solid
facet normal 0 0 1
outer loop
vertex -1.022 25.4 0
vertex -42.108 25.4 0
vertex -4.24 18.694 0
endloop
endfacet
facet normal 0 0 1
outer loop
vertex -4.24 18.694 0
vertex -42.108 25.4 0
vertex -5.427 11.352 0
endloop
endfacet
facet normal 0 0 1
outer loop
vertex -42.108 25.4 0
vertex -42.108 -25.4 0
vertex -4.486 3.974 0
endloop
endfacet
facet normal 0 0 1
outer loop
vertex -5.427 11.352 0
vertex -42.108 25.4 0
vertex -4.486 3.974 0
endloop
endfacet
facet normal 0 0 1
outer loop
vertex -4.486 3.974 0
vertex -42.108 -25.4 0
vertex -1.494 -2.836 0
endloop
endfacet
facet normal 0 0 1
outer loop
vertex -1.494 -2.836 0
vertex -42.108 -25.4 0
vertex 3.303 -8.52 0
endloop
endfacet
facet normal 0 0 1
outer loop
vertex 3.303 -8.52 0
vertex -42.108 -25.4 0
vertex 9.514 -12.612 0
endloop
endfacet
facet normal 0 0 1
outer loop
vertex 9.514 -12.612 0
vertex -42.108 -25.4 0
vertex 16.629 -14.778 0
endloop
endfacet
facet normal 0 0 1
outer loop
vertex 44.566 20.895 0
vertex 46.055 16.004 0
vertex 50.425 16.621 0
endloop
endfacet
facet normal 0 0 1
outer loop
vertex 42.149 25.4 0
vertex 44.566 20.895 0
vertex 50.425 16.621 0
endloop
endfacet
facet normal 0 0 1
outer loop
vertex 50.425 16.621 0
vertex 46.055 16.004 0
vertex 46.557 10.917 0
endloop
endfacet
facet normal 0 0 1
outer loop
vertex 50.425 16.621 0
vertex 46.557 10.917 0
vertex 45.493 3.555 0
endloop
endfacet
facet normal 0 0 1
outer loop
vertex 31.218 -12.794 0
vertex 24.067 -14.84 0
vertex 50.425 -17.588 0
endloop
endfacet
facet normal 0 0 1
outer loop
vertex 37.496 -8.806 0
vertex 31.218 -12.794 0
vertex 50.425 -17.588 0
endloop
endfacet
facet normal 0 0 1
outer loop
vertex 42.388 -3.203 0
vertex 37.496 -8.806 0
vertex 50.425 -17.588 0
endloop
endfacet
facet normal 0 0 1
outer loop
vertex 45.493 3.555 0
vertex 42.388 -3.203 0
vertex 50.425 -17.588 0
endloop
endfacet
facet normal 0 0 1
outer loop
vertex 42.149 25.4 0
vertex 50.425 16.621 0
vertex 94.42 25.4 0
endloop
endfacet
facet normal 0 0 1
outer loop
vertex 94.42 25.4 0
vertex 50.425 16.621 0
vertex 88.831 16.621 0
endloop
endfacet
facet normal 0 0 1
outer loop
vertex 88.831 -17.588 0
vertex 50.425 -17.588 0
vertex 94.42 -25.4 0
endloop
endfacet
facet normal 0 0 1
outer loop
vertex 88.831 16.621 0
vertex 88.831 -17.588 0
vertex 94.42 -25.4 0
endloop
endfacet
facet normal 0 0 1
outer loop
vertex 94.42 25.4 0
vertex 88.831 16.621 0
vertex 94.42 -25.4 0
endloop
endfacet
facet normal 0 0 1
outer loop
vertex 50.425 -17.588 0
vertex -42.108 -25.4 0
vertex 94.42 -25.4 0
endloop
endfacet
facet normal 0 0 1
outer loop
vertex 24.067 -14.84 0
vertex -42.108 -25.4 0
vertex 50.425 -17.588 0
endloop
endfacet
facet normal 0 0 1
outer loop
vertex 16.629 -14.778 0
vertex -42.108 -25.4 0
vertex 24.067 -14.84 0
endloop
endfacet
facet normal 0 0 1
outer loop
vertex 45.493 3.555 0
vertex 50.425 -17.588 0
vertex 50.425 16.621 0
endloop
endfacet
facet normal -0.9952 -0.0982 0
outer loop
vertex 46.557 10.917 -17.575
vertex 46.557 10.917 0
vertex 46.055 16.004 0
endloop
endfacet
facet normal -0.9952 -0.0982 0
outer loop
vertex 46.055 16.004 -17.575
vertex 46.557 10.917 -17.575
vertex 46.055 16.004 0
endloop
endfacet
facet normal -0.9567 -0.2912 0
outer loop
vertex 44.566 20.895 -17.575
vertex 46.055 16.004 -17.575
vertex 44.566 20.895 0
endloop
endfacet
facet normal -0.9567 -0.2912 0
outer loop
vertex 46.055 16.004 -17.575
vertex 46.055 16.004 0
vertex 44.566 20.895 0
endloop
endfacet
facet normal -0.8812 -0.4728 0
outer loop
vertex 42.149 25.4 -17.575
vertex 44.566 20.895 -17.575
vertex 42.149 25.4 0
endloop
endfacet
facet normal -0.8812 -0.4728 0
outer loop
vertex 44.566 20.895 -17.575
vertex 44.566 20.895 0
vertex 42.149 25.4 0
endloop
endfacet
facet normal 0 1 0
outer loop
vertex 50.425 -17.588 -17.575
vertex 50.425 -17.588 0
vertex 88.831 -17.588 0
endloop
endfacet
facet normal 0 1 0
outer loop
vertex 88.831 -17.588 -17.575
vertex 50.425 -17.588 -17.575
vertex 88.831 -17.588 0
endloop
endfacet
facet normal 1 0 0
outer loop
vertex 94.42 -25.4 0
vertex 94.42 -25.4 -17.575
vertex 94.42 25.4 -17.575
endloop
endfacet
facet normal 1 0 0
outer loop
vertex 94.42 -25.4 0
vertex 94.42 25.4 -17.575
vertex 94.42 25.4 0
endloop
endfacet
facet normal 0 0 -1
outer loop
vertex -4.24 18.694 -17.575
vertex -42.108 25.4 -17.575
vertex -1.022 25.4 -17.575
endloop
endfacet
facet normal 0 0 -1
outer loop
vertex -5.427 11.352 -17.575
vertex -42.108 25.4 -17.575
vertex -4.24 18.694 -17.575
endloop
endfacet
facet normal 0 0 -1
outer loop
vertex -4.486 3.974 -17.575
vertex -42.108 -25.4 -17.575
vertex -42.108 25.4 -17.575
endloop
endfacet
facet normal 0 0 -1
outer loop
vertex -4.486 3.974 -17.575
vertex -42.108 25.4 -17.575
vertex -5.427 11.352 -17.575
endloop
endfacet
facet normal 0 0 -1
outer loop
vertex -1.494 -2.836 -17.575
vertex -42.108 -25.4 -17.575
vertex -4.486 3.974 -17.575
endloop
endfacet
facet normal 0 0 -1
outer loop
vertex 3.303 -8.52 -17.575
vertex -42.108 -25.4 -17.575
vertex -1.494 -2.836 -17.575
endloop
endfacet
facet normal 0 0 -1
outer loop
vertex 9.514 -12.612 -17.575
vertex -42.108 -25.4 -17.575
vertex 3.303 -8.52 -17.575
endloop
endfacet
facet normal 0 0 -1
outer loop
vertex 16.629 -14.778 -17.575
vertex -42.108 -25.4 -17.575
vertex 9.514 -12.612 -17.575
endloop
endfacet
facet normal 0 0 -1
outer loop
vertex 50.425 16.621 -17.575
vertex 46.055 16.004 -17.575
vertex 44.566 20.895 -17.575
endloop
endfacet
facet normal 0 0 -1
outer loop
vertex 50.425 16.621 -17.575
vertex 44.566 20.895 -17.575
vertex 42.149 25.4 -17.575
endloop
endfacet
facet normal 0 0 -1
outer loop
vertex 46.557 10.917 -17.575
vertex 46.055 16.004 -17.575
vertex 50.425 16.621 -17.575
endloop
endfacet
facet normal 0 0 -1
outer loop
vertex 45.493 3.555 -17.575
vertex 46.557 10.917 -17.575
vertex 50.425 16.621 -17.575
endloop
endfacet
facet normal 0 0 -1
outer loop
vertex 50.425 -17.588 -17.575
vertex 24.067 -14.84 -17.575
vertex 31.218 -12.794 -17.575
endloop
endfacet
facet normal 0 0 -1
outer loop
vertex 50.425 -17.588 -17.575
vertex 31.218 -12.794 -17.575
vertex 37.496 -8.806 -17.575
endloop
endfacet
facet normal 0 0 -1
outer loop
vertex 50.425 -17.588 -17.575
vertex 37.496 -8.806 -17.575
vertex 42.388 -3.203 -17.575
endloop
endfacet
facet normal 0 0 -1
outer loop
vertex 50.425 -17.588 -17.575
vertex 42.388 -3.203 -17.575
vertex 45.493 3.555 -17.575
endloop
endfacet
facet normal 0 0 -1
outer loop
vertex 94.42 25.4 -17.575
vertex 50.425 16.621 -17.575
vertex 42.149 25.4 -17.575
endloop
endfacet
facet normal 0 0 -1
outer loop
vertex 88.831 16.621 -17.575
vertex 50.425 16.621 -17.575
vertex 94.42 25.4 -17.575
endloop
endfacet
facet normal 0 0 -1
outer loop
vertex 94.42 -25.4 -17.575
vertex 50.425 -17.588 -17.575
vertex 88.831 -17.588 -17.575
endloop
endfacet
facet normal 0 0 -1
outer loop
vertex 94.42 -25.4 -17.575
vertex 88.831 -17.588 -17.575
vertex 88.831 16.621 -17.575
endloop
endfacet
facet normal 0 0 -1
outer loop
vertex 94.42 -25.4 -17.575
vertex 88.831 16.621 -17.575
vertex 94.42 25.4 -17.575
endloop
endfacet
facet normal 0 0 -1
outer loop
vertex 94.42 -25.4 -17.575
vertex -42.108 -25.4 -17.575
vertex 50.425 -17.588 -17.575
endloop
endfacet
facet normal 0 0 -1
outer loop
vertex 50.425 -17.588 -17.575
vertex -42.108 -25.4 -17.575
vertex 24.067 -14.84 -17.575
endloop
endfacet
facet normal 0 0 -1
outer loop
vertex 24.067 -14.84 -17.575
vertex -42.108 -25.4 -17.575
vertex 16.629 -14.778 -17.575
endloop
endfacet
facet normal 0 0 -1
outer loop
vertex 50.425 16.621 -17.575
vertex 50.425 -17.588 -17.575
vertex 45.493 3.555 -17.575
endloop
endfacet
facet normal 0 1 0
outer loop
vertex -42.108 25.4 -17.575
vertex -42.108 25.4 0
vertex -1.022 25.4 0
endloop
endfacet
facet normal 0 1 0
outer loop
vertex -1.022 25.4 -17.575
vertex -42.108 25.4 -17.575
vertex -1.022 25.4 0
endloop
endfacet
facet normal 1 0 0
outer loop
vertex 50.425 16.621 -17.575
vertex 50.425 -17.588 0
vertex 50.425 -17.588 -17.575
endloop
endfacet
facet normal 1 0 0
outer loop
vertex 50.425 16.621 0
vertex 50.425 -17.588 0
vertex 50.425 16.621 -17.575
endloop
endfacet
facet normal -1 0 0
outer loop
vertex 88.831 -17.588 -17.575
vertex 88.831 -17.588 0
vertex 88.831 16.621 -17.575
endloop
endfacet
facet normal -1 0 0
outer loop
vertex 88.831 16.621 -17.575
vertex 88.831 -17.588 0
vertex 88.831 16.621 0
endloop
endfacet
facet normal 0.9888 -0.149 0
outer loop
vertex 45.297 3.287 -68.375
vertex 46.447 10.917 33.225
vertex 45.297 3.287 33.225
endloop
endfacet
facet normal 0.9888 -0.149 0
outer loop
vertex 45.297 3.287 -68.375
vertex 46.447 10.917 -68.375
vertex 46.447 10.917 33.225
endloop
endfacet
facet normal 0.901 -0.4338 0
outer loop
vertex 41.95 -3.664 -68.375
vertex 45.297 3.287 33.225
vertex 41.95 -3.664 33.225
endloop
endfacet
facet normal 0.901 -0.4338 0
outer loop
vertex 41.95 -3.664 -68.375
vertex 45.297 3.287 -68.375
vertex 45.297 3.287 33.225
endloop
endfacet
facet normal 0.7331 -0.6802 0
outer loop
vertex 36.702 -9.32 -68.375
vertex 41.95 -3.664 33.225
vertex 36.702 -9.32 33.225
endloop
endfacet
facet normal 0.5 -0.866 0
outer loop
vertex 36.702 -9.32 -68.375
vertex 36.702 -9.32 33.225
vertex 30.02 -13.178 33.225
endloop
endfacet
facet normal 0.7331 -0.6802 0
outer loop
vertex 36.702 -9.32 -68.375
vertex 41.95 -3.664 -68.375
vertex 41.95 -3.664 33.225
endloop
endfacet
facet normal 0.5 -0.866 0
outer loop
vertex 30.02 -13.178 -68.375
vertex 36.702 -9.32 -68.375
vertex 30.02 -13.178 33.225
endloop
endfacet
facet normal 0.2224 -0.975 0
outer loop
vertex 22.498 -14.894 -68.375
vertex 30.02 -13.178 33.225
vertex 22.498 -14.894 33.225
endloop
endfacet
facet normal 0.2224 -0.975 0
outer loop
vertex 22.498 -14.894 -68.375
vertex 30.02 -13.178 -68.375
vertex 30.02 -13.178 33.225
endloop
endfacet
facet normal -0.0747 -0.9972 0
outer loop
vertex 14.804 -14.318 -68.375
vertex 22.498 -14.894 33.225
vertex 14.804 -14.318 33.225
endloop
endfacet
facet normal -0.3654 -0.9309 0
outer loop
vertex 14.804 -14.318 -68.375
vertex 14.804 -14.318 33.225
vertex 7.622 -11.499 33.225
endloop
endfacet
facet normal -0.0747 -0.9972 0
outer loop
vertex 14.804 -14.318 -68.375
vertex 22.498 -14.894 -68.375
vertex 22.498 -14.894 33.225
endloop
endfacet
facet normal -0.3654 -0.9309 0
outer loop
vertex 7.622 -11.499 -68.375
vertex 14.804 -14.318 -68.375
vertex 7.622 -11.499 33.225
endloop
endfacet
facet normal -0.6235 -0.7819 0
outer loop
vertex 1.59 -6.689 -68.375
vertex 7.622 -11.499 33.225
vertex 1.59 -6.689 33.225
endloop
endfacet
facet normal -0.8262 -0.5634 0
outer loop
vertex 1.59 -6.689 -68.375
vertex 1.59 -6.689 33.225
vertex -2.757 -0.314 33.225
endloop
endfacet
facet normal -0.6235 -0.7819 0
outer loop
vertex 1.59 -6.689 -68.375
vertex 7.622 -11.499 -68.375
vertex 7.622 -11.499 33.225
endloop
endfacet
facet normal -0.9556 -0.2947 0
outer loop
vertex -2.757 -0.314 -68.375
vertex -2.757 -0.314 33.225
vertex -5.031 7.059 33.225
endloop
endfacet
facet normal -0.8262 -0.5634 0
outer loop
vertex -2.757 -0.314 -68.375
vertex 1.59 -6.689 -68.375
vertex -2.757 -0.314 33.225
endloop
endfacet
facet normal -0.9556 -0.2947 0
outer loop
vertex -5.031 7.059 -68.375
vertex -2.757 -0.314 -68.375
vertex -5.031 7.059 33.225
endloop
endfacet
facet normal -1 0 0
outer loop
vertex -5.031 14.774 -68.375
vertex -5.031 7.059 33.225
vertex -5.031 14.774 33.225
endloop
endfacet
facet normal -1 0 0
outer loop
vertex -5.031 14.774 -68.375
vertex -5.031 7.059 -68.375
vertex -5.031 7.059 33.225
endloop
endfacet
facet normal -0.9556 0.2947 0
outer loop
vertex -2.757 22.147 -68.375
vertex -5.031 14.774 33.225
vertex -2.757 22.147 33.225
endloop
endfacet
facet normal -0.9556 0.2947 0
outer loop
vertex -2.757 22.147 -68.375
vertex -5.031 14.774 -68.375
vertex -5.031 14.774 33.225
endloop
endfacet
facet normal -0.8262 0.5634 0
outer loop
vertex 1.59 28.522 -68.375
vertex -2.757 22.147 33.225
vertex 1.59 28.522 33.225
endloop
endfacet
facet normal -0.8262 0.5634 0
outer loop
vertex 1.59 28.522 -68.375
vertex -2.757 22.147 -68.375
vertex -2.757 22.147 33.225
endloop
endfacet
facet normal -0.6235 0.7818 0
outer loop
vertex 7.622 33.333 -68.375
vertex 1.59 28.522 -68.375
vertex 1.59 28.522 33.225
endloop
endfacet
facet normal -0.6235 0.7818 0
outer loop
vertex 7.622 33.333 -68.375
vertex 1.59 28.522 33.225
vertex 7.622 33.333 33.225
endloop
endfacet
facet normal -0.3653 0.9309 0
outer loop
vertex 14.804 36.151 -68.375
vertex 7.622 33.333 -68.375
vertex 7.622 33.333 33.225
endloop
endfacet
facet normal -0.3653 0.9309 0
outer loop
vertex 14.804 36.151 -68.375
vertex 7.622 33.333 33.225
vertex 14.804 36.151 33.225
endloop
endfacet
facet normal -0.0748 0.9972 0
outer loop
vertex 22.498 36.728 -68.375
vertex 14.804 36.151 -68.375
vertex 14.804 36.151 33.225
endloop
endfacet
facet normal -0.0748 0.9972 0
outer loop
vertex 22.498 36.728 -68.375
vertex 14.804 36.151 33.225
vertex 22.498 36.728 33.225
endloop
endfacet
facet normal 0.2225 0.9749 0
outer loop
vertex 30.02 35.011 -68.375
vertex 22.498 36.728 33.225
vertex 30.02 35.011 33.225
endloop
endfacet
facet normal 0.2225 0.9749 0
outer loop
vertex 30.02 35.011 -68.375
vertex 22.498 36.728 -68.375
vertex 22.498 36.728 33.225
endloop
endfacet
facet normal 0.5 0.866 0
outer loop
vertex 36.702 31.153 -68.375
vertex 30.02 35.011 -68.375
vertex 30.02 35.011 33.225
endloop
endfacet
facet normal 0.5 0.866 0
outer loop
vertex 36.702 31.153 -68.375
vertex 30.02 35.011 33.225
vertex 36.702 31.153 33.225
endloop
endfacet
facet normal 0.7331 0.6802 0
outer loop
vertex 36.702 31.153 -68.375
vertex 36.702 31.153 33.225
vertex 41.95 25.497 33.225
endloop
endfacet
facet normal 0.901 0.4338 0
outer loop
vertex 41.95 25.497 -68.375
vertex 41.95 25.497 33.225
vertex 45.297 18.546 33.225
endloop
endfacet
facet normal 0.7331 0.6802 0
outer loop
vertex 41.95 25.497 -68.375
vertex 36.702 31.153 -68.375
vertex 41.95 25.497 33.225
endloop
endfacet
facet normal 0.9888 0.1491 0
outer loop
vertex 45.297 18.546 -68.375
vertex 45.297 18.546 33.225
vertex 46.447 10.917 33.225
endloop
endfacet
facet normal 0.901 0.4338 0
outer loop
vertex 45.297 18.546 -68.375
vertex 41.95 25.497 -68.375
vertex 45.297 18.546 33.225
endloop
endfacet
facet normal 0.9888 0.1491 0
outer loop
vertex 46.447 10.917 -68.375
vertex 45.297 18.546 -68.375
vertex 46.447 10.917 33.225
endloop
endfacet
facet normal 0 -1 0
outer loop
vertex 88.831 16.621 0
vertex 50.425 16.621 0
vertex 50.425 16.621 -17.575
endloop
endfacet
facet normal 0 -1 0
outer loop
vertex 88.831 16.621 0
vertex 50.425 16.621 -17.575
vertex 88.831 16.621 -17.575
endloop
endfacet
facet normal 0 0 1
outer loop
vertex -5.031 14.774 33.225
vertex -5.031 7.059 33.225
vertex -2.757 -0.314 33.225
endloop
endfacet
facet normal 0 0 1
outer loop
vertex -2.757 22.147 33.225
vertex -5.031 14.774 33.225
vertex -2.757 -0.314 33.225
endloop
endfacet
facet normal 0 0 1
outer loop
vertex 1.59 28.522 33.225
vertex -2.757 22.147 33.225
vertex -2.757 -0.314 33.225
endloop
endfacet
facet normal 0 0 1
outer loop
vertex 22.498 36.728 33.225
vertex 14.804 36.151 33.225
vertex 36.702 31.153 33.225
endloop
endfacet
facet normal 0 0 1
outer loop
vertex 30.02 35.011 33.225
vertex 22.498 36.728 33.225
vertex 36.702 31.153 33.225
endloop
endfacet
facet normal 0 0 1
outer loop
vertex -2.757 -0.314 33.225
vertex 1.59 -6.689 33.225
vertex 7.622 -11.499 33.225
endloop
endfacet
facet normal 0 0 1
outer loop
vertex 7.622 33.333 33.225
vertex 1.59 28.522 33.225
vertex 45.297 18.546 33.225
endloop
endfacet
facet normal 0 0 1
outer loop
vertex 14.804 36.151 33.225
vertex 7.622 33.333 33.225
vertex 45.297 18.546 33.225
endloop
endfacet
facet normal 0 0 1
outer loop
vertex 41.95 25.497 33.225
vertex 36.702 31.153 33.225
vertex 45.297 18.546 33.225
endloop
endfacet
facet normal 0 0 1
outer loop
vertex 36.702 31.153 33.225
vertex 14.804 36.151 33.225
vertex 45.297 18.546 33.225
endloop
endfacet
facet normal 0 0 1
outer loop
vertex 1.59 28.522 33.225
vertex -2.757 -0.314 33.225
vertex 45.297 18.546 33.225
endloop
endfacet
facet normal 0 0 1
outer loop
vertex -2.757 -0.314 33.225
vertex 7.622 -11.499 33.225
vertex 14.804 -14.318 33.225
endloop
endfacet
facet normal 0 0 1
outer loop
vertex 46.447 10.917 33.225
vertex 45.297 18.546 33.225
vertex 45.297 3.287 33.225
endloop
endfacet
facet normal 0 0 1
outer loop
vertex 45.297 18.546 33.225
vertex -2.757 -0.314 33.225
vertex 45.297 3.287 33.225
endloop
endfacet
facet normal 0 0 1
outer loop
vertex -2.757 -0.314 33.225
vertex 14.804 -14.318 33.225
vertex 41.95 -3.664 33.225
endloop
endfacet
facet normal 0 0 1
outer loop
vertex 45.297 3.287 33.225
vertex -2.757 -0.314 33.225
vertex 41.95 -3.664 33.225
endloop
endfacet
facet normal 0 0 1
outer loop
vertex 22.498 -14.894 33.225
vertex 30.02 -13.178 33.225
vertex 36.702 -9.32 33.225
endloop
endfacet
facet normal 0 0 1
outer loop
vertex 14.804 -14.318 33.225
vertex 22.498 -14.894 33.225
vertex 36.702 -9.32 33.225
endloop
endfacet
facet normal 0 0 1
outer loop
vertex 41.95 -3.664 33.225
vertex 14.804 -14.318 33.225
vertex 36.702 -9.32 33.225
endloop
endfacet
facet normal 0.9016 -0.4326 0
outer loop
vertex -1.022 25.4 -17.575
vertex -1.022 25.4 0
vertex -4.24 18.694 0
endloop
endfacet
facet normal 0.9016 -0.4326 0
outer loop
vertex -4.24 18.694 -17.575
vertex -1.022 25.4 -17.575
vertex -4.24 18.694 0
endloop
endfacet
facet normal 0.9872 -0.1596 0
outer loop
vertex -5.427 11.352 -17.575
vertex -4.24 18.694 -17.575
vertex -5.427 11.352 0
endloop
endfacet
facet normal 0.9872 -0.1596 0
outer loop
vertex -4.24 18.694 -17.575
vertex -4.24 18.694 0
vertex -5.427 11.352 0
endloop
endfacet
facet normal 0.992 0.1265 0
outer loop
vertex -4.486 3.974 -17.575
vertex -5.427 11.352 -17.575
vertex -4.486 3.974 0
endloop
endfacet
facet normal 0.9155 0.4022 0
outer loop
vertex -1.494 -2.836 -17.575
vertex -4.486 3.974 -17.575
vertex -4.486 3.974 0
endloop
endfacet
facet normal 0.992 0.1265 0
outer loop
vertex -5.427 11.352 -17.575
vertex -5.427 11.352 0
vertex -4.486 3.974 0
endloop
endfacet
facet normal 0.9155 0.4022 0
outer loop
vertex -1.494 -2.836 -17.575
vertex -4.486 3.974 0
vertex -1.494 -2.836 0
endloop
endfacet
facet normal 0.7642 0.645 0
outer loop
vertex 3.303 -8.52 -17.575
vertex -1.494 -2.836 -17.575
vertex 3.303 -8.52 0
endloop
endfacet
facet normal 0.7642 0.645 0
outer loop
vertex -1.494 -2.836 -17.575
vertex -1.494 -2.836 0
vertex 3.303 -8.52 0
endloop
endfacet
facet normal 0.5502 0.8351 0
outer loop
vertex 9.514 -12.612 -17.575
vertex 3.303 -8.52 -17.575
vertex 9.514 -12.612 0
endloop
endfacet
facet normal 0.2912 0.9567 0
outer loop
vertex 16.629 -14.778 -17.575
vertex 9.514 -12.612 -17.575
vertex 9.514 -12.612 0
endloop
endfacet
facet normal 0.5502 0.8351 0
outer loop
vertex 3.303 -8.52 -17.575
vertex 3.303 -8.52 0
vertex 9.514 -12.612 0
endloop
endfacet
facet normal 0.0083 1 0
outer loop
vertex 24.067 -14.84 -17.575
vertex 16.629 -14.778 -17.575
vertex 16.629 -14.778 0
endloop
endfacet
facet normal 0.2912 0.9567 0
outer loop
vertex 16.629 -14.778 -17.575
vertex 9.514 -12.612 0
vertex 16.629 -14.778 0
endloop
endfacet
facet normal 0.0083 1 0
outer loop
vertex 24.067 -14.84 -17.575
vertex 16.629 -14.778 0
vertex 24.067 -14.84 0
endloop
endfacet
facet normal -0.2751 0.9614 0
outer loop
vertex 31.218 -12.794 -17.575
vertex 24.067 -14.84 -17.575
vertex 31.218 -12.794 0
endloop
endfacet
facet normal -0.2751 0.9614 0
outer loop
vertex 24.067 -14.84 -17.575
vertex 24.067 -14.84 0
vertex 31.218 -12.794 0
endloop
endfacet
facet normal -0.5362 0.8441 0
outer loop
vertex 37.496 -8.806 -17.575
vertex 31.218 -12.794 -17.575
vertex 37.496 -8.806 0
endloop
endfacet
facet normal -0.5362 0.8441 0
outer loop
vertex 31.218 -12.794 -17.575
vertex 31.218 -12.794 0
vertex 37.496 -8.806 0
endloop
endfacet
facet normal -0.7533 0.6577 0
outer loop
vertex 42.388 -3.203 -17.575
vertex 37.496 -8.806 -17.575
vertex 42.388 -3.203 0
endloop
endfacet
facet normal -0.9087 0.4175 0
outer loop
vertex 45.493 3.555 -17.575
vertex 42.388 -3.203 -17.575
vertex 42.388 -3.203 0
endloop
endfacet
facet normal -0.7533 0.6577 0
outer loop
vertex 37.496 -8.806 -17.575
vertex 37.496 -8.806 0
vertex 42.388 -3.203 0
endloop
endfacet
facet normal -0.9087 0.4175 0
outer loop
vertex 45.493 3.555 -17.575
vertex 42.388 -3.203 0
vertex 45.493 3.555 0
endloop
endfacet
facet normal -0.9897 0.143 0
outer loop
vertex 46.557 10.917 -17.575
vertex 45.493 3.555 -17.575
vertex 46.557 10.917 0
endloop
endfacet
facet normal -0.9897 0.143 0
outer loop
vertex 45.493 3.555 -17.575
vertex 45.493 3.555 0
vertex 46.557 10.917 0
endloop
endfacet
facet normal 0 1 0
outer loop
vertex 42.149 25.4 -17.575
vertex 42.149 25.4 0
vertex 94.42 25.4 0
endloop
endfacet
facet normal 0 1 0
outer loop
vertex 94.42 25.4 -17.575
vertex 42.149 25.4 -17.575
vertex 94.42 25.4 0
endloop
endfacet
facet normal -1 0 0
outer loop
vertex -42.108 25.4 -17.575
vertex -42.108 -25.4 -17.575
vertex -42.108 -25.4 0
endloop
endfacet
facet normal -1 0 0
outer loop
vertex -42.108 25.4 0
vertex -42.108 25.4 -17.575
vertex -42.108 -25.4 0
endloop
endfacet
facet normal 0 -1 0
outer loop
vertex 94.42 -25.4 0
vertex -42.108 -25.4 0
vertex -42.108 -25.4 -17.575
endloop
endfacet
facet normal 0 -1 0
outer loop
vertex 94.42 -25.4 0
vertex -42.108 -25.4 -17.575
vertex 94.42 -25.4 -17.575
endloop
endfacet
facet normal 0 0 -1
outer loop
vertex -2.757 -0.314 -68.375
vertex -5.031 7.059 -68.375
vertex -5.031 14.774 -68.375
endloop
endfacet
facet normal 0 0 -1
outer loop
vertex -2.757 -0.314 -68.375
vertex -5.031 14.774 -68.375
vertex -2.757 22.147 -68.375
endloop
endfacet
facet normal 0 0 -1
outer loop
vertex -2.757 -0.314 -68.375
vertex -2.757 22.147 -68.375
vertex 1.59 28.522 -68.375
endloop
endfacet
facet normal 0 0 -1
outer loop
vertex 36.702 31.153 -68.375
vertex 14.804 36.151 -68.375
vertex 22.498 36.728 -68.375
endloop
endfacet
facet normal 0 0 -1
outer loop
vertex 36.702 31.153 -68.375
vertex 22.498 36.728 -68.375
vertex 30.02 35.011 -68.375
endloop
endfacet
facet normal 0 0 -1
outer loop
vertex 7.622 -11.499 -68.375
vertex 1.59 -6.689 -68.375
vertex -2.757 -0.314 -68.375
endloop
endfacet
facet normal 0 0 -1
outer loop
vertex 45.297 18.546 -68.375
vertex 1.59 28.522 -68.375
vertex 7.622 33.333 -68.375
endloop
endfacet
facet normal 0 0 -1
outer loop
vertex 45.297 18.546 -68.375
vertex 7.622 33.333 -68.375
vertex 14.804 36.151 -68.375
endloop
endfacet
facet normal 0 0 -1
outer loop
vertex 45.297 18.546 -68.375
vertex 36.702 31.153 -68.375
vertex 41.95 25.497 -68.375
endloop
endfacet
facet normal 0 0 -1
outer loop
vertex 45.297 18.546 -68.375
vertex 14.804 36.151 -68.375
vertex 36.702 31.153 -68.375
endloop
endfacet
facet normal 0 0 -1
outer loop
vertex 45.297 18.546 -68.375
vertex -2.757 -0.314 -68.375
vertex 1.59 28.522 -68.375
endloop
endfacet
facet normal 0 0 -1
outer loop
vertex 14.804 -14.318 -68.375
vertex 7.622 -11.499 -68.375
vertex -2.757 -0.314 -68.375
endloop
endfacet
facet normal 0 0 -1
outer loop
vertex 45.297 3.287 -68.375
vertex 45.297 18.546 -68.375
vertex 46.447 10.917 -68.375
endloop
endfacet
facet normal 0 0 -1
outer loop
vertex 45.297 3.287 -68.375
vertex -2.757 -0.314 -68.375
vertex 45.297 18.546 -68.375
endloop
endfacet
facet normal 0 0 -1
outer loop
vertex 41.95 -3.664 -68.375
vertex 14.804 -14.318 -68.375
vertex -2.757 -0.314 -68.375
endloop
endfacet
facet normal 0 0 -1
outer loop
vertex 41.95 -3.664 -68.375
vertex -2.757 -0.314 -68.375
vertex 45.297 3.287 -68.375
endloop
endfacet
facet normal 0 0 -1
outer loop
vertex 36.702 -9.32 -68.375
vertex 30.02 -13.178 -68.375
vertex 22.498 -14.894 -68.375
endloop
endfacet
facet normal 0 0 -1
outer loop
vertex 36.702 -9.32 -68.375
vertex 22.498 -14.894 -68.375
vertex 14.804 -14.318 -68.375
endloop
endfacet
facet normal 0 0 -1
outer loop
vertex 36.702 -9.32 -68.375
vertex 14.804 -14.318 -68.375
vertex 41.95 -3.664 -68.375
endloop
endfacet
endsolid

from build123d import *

# Parameters (mm, degrees)
F0_W          = 136.528157
F0_H          = 17.575454
F1_DEPTH      = 25.4
F1_DEPTH_BACK = 25.4
F3_DEPTH      = 25.4
F4_W          = 38.406905
F4_H          = 34.208939
F5_DEPTH      = 25.4
F6_R          = 25.883576
F7_DEPTH      = 50.8
F7_DEPTH_BACK = 50.8


with BuildPart() as f1:
    # F0 (on Front) → F1 (new body, two sides)
    with BuildSketch(Plane.XZ) as f1_sk:
        with Locations((26.155728, -8.787727)):
            Rectangle(F0_W, F0_H)
    extrude(amount=F1_DEPTH)
    extrude(f1_sk.sketch, amount=-F1_DEPTH_BACK)

    # F2 (on face) → F3 (cut)
    with BuildSketch(Plane.XY):
        with BuildLine():
            Line((-1.021694, 25.4), (42.14872, 25.4))
            ThreePointArc((42.14872, 25.4), (20.563513, 36.910687), (-1.021694, 25.4))
        make_face()
        with BuildLine():
            ThreePointArc((-1.021694, 25.4), (12.993788, -13.95066), (46.55749, 10.91671))
            ThreePointArc((46.55749, 10.91671), (45.430883, 18.486435), (42.14872, 25.4))
            Line((42.14872, 25.4), (-1.021694, 25.4))
        make_face()
    extrude(amount=-F3_DEPTH, mode=Mode.SUBTRACT)

    # F4 (on face) → F5 (cut)
    with BuildSketch(Plane.XY):
        with Locations((69.627972, -0.483111)):
            Rectangle(F4_W, F4_H)
    extrude(amount=-F5_DEPTH, mode=Mode.SUBTRACT)


with BuildPart() as f7:
    # F6 (on face) → F7 (new body, two sides)
    with BuildSketch(Plane(origin=(0, 0, -17.575454), x_dir=(1, 0, 0), z_dir=(0, 0, -1))) as f7_sk:
        with Locations((20.563513, -10.91671)):
            Circle(F6_R)
    extrude(amount=F7_DEPTH)
    extrude(f7_sk.sketch, amount=-F7_DEPTH_BACK)


solid = Compound([f1.part, f7.part])
